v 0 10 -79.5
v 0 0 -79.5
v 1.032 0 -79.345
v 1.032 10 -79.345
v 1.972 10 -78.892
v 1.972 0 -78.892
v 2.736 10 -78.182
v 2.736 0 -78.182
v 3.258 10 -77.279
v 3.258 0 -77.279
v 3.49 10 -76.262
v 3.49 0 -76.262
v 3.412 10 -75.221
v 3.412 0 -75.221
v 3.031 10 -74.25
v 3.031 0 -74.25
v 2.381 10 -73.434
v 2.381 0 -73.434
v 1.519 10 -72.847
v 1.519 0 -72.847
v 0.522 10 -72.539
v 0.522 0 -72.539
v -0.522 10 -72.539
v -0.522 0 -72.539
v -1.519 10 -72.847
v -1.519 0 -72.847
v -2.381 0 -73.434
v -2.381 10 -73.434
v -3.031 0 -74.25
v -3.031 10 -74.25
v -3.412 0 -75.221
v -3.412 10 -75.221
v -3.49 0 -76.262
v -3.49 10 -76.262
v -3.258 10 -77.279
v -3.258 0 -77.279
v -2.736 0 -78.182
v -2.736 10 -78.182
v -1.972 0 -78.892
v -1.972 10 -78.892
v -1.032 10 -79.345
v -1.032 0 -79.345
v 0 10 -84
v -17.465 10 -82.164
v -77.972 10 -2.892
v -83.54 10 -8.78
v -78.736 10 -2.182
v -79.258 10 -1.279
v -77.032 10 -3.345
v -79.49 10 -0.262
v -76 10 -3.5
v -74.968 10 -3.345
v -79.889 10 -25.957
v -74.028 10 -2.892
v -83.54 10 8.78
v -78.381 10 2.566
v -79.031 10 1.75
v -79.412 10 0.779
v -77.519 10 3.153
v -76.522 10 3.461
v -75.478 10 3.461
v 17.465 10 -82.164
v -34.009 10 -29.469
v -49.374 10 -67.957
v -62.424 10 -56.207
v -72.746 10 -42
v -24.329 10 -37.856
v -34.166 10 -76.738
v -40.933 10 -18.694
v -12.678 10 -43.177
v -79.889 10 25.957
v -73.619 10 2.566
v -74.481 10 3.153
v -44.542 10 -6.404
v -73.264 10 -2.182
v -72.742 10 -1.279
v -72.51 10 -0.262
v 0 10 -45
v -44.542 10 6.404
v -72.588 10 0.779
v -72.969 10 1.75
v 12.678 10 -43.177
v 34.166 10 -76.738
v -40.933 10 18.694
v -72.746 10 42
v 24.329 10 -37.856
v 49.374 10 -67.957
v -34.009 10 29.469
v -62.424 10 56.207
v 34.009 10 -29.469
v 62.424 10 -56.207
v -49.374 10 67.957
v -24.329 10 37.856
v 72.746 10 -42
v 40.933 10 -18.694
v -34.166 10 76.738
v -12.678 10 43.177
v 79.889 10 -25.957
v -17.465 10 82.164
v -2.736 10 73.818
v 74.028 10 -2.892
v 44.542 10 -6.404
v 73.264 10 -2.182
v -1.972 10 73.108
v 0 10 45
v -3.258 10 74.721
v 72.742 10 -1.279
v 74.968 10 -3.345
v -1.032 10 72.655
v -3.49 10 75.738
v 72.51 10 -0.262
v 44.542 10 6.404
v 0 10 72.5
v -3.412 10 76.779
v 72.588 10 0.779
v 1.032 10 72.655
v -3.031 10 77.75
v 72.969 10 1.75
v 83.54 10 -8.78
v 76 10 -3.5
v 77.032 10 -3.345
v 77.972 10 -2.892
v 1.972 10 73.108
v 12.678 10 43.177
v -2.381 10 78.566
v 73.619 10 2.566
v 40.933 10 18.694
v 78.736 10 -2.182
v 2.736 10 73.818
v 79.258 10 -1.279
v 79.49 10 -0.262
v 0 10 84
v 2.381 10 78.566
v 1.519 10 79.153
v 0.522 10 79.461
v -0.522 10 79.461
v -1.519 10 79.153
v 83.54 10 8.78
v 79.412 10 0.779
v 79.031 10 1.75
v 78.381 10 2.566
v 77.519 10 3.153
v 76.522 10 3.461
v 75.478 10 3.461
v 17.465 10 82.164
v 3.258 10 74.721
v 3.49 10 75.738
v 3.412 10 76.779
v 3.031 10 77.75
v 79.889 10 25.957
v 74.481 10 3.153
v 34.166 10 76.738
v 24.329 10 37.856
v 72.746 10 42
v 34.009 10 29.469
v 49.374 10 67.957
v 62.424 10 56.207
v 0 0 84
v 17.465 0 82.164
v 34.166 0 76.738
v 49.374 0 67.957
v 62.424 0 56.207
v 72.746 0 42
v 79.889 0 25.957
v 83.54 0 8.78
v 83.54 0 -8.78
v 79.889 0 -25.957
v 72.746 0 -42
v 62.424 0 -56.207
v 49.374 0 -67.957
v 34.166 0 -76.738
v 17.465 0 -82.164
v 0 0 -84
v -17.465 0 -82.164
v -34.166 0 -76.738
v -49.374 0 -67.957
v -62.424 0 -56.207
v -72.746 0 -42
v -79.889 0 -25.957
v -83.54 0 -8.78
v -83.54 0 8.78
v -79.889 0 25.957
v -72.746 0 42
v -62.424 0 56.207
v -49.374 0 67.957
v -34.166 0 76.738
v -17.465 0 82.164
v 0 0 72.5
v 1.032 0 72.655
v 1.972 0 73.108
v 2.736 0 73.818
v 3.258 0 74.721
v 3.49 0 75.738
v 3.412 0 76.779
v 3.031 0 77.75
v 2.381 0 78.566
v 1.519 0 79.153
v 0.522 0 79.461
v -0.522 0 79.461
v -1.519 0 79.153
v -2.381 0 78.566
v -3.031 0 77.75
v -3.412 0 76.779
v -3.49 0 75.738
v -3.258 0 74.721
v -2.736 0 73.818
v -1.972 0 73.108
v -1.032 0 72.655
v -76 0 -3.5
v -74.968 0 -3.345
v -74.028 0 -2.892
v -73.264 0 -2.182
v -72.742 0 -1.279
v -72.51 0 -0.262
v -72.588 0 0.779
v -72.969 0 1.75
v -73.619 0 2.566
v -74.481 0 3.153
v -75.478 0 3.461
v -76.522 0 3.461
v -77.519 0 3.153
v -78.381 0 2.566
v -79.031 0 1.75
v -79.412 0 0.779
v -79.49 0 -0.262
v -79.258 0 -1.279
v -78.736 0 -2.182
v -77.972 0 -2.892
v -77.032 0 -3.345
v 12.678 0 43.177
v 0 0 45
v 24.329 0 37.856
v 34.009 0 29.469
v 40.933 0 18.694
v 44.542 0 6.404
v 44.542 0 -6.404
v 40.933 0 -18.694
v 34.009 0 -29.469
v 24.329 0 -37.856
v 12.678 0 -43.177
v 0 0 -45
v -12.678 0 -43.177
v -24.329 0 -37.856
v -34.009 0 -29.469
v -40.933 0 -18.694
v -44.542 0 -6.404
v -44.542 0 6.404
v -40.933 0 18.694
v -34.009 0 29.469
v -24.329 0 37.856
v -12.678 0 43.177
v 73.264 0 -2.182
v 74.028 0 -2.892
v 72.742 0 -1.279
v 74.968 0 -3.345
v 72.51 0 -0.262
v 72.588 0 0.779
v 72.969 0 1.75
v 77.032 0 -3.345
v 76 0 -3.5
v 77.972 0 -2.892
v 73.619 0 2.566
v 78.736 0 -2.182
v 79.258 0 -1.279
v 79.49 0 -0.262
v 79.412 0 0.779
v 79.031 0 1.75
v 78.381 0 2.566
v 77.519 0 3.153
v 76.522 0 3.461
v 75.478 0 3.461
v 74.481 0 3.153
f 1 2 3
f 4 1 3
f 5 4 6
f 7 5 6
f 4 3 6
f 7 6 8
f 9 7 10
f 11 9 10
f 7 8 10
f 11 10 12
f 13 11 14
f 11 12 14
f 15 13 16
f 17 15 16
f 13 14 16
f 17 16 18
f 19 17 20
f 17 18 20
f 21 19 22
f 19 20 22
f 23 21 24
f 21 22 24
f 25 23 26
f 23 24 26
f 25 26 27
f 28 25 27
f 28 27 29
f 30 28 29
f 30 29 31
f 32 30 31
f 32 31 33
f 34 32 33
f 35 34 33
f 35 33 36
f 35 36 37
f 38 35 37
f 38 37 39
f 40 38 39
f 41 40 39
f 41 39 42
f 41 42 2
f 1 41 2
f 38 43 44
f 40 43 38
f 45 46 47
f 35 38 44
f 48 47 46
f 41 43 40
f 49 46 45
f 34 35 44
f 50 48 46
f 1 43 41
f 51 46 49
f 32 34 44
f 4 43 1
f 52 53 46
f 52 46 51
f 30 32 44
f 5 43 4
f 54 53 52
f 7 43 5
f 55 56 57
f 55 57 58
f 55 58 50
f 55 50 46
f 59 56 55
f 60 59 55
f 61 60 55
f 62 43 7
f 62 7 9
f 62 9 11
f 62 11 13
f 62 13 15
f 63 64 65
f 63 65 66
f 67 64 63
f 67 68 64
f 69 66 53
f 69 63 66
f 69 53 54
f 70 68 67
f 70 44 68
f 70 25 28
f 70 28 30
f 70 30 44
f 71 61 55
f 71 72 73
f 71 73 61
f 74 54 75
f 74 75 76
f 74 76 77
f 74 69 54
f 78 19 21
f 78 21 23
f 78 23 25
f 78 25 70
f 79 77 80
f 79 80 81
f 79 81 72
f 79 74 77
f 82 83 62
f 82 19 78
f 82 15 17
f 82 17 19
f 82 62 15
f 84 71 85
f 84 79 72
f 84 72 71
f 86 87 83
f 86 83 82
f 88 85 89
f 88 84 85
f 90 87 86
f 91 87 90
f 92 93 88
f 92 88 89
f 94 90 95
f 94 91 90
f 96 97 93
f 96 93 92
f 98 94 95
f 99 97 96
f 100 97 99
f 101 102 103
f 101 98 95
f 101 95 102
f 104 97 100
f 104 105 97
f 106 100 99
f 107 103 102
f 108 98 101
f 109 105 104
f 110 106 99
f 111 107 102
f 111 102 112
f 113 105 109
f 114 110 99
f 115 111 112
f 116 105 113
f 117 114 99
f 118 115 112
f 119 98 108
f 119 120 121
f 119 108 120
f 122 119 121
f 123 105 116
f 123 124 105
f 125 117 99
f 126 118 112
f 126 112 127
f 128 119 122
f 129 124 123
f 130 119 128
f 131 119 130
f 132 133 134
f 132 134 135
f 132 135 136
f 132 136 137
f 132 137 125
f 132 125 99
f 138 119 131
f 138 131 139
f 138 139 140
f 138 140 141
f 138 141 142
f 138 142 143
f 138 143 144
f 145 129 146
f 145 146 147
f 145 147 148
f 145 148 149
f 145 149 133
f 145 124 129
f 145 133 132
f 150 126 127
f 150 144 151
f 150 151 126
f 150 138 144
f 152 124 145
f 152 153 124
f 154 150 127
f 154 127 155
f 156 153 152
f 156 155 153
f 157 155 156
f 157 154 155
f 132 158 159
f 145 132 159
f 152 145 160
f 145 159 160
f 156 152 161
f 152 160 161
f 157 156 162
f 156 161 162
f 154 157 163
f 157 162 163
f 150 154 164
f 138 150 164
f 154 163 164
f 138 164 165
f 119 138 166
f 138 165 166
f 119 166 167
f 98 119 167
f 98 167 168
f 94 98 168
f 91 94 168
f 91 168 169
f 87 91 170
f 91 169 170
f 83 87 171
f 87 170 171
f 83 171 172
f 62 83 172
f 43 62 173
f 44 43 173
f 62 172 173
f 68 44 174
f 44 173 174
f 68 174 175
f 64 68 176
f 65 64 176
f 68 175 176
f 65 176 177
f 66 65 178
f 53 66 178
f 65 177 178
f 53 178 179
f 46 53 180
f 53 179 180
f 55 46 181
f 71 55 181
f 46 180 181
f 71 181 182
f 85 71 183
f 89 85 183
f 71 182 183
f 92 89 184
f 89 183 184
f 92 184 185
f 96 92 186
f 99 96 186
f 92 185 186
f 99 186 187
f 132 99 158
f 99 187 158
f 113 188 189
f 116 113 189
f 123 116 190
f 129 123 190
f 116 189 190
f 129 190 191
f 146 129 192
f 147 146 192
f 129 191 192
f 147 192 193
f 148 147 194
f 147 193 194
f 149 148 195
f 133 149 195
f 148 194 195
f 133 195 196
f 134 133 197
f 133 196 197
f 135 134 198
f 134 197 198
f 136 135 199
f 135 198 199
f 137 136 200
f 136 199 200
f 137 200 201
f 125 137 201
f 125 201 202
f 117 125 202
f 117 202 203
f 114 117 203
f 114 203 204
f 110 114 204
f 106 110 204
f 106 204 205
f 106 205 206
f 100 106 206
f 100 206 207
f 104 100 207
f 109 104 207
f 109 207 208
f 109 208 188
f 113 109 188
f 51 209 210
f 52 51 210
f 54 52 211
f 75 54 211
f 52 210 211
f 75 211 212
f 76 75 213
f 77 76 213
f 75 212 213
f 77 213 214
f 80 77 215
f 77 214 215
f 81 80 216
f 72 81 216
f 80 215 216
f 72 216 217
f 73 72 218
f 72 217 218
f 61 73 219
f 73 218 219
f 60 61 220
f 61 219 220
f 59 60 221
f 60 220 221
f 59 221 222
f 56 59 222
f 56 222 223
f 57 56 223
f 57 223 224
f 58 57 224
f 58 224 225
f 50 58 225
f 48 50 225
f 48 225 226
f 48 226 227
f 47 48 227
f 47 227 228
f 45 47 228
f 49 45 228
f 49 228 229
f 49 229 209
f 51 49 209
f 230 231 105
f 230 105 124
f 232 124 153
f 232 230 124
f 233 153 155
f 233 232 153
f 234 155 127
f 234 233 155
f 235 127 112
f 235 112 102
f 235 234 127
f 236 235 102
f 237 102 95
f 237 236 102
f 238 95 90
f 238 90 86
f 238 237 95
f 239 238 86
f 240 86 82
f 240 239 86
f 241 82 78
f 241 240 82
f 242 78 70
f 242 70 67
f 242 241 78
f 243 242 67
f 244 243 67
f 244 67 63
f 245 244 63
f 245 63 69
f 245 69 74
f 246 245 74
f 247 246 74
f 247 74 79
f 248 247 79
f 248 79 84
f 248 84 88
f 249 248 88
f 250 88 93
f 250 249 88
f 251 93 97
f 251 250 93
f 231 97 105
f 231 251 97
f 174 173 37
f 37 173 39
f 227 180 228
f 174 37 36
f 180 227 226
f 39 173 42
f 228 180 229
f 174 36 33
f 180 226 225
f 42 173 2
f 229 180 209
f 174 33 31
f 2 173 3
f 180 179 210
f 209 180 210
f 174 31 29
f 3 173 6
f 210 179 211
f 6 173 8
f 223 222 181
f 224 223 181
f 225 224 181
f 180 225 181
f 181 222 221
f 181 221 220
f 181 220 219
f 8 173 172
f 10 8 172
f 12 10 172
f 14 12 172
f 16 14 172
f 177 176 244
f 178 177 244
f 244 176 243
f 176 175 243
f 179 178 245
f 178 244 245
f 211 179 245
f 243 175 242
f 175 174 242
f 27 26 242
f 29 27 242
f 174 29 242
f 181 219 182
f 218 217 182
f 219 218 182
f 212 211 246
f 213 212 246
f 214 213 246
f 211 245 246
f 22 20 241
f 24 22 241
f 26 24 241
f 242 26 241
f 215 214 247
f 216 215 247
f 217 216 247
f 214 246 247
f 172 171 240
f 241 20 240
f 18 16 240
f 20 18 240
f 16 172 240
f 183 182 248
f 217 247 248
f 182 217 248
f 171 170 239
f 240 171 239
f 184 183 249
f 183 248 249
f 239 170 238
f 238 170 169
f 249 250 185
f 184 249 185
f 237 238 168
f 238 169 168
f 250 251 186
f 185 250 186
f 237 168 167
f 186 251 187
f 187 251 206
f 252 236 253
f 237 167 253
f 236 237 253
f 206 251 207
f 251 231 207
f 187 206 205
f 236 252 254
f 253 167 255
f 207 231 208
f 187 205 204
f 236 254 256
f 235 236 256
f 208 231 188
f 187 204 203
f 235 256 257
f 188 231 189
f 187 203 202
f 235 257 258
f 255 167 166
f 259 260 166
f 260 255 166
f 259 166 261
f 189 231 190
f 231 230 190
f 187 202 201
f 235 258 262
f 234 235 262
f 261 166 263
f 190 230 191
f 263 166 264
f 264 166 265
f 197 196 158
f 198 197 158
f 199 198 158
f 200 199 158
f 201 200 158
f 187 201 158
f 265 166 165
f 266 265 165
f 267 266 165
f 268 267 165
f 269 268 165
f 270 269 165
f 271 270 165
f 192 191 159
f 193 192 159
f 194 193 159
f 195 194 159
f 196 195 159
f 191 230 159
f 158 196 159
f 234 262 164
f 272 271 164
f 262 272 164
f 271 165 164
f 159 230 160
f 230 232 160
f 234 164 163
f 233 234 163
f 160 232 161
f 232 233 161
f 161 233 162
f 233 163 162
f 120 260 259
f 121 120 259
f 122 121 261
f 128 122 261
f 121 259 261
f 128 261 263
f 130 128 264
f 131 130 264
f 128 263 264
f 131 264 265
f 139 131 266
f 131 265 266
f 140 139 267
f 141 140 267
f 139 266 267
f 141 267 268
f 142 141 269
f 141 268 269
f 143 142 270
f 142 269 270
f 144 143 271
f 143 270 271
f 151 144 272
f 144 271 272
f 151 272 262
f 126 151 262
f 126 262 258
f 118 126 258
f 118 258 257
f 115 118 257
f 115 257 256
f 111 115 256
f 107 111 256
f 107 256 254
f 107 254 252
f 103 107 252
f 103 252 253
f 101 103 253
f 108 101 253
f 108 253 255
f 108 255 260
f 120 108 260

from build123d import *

# Parameters (mm, degrees)
SKETCH1_R            = 84
SKETCH1_R_2          = 45
BOSS_EXTRUDE1_DEPTH  = 10
M6_CLEARANCE_HOLE1_D = 7


with BuildPart() as part:
    # Sketch1 → Boss-Extrude1 (new body)
    with BuildSketch(Plane(origin=(0, 0, 0), x_dir=(1, 0, 0), z_dir=(0, 1, 0))):
        with Locations(Location((0, 0, 0), (0, 0, 270))):
            Circle(SKETCH1_R)
        with Locations(Location((0, 0, 0), (0, 0, 270))):
            Circle(SKETCH1_R_2, mode=Mode.SUBTRACT)
    extrude(amount=BOSS_EXTRUDE1_DEPTH)

    # M6 Clearance Hole1 (through all)
    with Locations(Plane(origin=(-76, 10, 0), x_dir=(0, 0, 1), z_dir=(0, 1, 0))):
        with Locations((0, 0), (-76, 76), (0, 152), (76, 76)):
            Hole(M6_CLEARANCE_HOLE1_D / 2)


solid = part.part
